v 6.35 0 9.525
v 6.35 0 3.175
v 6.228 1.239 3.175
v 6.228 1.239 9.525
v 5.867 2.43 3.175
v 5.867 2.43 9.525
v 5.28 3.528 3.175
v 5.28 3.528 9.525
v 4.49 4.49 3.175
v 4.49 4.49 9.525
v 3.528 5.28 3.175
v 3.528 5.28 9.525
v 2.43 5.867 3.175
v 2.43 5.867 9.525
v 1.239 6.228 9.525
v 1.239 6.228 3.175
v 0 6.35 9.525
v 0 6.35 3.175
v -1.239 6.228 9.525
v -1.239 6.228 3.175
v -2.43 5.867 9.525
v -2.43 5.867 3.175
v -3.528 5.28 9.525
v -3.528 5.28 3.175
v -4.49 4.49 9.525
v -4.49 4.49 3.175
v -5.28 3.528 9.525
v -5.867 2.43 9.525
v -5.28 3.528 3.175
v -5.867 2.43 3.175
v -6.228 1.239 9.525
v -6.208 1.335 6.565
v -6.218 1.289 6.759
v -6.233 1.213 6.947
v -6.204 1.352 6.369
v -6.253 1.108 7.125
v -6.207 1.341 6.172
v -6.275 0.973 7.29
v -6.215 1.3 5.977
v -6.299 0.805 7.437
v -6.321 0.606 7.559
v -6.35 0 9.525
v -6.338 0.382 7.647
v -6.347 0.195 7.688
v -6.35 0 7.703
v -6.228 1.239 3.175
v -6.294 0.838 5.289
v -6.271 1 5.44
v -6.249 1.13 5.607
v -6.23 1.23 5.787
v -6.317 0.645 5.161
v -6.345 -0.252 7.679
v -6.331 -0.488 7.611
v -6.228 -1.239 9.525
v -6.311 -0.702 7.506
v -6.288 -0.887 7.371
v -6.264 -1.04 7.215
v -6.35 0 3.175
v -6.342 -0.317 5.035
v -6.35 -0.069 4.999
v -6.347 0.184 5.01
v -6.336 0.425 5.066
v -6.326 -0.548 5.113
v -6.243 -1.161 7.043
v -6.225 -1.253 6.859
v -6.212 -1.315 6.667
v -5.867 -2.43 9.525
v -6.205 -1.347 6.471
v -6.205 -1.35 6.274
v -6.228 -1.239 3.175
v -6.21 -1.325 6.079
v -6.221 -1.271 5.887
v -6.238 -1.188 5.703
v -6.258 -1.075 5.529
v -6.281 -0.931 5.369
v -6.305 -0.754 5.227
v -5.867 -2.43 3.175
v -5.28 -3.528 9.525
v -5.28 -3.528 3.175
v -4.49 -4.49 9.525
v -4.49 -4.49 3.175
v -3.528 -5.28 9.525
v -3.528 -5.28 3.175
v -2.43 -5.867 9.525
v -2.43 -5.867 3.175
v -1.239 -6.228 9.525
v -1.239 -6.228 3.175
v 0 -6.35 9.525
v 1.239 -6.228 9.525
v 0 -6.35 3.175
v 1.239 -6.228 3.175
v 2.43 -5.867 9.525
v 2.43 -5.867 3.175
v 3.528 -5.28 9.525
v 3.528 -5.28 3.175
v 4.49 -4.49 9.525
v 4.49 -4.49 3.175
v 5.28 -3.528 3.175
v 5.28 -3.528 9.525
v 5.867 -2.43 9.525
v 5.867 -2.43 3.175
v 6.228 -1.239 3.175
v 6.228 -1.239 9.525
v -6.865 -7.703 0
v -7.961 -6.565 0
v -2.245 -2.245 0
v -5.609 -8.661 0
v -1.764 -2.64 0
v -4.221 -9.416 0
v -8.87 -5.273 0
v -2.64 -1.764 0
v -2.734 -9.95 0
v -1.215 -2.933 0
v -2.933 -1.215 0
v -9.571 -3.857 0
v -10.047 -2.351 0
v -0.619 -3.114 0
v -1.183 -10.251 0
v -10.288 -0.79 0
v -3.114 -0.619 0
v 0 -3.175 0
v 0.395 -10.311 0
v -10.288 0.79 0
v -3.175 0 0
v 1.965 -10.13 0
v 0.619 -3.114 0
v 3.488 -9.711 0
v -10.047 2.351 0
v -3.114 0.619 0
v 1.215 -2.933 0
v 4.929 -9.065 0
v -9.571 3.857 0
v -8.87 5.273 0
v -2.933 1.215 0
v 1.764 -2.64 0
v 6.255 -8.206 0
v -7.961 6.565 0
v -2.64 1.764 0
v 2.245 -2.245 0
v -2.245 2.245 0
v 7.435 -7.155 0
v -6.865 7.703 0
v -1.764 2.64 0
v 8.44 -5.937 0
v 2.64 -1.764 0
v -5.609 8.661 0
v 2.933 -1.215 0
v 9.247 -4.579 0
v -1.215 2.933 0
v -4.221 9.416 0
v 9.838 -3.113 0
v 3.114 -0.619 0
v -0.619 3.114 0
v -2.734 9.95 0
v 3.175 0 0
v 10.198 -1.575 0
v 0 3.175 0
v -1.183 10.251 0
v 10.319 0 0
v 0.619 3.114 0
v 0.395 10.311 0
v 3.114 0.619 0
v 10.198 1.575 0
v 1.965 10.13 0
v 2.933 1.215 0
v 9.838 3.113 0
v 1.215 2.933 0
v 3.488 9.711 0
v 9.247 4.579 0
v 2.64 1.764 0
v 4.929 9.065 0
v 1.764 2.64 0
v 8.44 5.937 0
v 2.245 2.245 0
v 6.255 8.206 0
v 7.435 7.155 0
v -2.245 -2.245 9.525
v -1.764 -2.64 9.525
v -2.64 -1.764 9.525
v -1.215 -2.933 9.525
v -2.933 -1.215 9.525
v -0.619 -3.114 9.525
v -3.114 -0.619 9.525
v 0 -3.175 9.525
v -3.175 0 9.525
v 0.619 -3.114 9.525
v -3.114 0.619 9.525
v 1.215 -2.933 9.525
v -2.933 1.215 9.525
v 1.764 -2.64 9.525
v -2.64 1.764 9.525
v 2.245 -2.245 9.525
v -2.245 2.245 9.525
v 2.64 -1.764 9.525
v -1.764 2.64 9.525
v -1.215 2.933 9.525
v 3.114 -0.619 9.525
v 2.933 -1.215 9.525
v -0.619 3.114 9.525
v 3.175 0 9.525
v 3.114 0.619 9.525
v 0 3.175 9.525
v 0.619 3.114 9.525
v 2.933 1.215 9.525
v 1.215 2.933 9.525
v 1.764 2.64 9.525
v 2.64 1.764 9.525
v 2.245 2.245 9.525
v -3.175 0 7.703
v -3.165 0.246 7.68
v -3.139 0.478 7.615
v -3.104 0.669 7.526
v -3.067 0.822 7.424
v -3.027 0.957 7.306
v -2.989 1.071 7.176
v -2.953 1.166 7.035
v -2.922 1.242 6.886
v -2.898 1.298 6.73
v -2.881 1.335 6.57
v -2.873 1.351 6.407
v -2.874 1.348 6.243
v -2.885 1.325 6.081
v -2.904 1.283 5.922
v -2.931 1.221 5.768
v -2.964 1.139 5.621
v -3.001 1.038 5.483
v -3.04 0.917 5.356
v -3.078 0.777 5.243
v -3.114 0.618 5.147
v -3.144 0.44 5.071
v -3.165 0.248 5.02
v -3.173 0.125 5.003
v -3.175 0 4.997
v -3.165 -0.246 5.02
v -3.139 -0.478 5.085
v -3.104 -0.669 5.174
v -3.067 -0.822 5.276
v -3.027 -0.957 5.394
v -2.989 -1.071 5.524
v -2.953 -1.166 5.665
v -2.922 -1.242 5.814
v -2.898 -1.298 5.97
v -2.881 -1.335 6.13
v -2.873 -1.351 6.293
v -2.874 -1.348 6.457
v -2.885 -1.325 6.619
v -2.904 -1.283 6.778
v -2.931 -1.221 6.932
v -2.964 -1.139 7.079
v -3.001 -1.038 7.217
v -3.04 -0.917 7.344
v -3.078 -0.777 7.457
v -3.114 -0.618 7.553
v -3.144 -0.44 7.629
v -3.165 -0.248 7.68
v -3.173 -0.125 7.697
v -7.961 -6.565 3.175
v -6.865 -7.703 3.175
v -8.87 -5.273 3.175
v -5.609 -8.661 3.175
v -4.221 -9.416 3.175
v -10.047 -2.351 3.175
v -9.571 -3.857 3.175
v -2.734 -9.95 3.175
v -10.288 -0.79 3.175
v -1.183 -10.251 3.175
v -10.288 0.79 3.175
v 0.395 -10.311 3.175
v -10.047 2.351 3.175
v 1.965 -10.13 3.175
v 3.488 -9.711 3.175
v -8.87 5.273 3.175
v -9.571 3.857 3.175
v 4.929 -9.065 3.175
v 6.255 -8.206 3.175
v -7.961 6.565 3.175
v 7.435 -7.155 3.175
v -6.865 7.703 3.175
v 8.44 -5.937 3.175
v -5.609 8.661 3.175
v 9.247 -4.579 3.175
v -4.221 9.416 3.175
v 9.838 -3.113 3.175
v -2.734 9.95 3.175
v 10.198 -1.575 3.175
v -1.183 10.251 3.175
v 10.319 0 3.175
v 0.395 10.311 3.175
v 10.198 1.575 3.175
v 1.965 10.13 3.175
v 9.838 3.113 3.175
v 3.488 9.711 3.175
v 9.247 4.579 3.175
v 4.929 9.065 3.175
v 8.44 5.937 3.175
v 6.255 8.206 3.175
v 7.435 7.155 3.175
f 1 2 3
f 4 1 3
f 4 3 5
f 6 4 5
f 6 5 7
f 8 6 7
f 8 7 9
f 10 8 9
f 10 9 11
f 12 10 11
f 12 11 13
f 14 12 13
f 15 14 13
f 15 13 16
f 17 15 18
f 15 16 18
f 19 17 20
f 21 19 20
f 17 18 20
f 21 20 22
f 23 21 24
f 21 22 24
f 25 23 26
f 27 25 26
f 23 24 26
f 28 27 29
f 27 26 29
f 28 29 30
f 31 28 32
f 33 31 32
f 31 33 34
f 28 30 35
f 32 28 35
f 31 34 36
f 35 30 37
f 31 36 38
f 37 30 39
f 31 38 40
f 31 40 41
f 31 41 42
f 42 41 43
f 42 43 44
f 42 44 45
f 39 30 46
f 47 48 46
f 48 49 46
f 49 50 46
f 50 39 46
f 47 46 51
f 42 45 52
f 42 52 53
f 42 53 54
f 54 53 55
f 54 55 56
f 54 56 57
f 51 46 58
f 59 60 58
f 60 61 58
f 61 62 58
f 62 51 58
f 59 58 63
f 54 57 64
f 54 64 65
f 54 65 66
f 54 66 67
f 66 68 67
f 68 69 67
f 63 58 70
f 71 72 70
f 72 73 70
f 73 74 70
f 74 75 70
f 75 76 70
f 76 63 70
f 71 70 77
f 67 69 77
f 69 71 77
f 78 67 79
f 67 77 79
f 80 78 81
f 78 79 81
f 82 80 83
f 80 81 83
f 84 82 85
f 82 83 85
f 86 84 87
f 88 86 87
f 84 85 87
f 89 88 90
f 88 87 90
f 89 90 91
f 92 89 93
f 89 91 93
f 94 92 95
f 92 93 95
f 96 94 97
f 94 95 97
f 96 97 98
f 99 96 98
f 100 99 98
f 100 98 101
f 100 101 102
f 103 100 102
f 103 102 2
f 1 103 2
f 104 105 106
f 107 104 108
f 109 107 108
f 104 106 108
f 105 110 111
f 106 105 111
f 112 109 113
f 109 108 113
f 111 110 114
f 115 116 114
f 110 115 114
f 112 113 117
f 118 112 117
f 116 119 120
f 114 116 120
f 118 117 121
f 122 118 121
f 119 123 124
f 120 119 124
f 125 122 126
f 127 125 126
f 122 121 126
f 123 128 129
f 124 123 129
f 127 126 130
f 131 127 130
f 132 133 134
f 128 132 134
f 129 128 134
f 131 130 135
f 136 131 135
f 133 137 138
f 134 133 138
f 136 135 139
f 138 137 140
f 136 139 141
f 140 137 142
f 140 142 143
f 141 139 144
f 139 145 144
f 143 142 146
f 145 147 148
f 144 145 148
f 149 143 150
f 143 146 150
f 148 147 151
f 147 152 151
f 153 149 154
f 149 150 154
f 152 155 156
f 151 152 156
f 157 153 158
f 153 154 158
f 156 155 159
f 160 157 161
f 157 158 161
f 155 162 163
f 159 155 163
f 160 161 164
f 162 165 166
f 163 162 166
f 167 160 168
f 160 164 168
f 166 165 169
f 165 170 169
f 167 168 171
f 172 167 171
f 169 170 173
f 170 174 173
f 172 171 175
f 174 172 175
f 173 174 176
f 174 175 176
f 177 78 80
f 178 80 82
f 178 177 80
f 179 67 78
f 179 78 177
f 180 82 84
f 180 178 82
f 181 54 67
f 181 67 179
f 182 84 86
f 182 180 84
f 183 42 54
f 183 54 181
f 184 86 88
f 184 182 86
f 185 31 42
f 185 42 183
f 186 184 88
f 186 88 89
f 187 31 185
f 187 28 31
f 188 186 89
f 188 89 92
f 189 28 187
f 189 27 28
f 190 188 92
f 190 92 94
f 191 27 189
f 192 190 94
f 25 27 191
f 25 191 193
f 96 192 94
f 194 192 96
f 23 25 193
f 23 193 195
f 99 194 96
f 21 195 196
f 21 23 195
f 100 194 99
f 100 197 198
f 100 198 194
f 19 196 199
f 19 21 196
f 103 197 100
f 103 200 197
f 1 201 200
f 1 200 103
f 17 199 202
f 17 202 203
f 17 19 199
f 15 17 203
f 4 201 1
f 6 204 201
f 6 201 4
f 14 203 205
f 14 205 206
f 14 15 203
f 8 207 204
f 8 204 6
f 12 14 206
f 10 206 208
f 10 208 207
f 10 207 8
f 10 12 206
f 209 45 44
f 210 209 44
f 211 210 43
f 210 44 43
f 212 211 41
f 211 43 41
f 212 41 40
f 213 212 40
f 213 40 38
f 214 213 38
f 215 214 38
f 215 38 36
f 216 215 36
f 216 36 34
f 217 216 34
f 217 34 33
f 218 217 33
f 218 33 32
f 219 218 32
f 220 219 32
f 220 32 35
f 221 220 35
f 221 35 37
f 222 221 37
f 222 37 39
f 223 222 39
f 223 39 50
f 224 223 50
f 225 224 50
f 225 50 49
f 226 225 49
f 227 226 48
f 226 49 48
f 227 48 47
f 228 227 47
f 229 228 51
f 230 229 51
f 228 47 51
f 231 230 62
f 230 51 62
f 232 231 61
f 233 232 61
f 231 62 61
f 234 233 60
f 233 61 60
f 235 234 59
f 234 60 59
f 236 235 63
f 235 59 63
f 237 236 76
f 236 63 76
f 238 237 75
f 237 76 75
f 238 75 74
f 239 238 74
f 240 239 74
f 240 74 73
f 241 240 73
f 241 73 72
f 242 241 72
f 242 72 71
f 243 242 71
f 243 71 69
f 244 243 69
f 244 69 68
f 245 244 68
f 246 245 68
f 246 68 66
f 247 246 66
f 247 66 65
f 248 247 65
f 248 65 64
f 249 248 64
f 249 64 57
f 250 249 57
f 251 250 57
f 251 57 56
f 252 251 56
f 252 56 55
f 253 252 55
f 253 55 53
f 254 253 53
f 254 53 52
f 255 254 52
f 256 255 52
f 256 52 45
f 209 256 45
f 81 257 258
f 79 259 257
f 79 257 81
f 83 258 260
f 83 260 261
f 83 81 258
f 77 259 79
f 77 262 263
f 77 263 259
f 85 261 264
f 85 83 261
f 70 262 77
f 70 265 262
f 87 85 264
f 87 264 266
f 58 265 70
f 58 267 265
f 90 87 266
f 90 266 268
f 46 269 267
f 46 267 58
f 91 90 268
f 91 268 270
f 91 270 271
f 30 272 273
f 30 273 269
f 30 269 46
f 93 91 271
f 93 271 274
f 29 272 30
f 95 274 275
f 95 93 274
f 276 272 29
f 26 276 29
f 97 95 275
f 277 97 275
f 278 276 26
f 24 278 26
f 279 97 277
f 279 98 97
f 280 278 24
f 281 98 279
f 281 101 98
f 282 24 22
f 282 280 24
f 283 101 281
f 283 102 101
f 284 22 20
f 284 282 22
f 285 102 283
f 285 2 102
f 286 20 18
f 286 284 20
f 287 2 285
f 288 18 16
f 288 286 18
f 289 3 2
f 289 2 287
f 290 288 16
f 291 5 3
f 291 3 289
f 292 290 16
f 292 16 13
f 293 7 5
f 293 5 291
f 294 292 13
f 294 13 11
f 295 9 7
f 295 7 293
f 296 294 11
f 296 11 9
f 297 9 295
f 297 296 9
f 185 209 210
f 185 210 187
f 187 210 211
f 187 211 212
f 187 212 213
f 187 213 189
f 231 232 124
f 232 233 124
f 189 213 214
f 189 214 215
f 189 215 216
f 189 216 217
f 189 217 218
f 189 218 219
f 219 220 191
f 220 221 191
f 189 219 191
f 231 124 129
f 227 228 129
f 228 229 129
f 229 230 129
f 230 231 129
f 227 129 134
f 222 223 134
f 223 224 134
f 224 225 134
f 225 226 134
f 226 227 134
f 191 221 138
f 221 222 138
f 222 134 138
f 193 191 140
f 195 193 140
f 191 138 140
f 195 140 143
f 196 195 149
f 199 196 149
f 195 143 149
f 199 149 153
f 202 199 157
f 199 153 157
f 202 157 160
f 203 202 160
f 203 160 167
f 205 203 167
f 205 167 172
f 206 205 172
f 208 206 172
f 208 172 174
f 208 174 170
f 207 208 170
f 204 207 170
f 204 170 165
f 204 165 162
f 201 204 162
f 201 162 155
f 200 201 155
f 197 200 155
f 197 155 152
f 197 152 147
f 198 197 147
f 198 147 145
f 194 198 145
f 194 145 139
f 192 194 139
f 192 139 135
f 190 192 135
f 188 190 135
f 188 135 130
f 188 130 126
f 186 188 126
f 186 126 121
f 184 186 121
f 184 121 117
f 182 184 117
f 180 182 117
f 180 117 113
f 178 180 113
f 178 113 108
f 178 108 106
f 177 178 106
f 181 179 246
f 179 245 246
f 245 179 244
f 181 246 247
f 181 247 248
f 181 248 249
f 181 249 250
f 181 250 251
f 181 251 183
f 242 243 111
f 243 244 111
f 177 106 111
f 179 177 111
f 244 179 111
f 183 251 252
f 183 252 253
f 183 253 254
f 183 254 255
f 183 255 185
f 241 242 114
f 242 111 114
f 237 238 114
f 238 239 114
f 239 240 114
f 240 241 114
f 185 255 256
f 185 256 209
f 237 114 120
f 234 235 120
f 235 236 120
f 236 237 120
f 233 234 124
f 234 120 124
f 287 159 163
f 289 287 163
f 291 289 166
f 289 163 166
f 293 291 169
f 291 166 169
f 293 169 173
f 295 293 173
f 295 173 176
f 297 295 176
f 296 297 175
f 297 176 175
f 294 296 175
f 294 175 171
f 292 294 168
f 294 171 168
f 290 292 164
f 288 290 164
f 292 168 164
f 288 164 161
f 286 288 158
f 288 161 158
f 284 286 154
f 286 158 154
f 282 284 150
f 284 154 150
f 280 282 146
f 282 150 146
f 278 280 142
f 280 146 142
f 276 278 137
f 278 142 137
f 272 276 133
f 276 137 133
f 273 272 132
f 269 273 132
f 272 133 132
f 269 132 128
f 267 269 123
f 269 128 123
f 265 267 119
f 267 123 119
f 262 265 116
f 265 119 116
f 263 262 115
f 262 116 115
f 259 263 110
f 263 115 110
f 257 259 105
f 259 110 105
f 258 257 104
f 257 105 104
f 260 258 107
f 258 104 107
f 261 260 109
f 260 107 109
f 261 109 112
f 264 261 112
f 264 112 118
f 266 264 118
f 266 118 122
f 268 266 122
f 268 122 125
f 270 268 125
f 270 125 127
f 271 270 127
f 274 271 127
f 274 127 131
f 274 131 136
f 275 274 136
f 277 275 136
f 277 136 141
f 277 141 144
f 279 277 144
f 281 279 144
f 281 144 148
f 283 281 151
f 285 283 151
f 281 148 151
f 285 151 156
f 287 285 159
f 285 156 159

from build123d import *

# Parameters (mm, degrees)
SKETCH1_R                  = 10.31875
BOSS_EXTRUDE1_DEPTH        = 3.175
SKETCH2_R                  = 6.35
BOSS_EXTRUDE2_DEPTH        = 6.35
SKETCH3_R                  = 3.175
CUT_EXTRUDE1_DEPTH         = 18.426383105
F_6_32_TAPPED_HOLE1_REACH  = 23.796
F_6_32_TAPPED_HOLE1_BORE_R = 1.35255


with BuildPart() as part:
    # Sketch1 → Boss-Extrude1 (new body)
    with BuildSketch(Plane.XY):
        Circle(SKETCH1_R)
    extrude(amount=BOSS_EXTRUDE1_DEPTH)

    # Sketch2 → Boss-Extrude2 (add)
    with BuildSketch(Plane.XY.offset(3.175)):
        Circle(SKETCH2_R)
    extrude(amount=BOSS_EXTRUDE2_DEPTH)

    # Sketch3 → Cut-Extrude1 (cut, through all)
    with BuildSketch(Plane(origin=(0, 0, 0), x_dir=(-1, 0, 0), z_dir=(0, 0, -1))):
        Circle(SKETCH3_R)
    extrude(amount=-CUT_EXTRUDE1_DEPTH, mode=Mode.SUBTRACT)

    # #6-32 Tapped Hole1 bore → #6-32 Tapped Hole1 (cut, up to next)
    with BuildSketch(Plane.ZY.offset(6.35), mode=Mode.PRIVATE) as f_6_32_tapped_hole1_sk1:
        with Locations((6.35, 0)):
            Circle(F_6_32_TAPPED_HOLE1_BORE_R)
    f_6_32_tapped_hole1_tool1 = extrude(f_6_32_tapped_hole1_sk1.sketch, amount=-F_6_32_TAPPED_HOLE1_REACH, mode=Mode.PRIVATE) & part.part
    add(f_6_32_tapped_hole1_tool1.solids().sort_by_distance((-6.35, 0, 6.35))[0], mode=Mode.SUBTRACT)


solid = part.part
